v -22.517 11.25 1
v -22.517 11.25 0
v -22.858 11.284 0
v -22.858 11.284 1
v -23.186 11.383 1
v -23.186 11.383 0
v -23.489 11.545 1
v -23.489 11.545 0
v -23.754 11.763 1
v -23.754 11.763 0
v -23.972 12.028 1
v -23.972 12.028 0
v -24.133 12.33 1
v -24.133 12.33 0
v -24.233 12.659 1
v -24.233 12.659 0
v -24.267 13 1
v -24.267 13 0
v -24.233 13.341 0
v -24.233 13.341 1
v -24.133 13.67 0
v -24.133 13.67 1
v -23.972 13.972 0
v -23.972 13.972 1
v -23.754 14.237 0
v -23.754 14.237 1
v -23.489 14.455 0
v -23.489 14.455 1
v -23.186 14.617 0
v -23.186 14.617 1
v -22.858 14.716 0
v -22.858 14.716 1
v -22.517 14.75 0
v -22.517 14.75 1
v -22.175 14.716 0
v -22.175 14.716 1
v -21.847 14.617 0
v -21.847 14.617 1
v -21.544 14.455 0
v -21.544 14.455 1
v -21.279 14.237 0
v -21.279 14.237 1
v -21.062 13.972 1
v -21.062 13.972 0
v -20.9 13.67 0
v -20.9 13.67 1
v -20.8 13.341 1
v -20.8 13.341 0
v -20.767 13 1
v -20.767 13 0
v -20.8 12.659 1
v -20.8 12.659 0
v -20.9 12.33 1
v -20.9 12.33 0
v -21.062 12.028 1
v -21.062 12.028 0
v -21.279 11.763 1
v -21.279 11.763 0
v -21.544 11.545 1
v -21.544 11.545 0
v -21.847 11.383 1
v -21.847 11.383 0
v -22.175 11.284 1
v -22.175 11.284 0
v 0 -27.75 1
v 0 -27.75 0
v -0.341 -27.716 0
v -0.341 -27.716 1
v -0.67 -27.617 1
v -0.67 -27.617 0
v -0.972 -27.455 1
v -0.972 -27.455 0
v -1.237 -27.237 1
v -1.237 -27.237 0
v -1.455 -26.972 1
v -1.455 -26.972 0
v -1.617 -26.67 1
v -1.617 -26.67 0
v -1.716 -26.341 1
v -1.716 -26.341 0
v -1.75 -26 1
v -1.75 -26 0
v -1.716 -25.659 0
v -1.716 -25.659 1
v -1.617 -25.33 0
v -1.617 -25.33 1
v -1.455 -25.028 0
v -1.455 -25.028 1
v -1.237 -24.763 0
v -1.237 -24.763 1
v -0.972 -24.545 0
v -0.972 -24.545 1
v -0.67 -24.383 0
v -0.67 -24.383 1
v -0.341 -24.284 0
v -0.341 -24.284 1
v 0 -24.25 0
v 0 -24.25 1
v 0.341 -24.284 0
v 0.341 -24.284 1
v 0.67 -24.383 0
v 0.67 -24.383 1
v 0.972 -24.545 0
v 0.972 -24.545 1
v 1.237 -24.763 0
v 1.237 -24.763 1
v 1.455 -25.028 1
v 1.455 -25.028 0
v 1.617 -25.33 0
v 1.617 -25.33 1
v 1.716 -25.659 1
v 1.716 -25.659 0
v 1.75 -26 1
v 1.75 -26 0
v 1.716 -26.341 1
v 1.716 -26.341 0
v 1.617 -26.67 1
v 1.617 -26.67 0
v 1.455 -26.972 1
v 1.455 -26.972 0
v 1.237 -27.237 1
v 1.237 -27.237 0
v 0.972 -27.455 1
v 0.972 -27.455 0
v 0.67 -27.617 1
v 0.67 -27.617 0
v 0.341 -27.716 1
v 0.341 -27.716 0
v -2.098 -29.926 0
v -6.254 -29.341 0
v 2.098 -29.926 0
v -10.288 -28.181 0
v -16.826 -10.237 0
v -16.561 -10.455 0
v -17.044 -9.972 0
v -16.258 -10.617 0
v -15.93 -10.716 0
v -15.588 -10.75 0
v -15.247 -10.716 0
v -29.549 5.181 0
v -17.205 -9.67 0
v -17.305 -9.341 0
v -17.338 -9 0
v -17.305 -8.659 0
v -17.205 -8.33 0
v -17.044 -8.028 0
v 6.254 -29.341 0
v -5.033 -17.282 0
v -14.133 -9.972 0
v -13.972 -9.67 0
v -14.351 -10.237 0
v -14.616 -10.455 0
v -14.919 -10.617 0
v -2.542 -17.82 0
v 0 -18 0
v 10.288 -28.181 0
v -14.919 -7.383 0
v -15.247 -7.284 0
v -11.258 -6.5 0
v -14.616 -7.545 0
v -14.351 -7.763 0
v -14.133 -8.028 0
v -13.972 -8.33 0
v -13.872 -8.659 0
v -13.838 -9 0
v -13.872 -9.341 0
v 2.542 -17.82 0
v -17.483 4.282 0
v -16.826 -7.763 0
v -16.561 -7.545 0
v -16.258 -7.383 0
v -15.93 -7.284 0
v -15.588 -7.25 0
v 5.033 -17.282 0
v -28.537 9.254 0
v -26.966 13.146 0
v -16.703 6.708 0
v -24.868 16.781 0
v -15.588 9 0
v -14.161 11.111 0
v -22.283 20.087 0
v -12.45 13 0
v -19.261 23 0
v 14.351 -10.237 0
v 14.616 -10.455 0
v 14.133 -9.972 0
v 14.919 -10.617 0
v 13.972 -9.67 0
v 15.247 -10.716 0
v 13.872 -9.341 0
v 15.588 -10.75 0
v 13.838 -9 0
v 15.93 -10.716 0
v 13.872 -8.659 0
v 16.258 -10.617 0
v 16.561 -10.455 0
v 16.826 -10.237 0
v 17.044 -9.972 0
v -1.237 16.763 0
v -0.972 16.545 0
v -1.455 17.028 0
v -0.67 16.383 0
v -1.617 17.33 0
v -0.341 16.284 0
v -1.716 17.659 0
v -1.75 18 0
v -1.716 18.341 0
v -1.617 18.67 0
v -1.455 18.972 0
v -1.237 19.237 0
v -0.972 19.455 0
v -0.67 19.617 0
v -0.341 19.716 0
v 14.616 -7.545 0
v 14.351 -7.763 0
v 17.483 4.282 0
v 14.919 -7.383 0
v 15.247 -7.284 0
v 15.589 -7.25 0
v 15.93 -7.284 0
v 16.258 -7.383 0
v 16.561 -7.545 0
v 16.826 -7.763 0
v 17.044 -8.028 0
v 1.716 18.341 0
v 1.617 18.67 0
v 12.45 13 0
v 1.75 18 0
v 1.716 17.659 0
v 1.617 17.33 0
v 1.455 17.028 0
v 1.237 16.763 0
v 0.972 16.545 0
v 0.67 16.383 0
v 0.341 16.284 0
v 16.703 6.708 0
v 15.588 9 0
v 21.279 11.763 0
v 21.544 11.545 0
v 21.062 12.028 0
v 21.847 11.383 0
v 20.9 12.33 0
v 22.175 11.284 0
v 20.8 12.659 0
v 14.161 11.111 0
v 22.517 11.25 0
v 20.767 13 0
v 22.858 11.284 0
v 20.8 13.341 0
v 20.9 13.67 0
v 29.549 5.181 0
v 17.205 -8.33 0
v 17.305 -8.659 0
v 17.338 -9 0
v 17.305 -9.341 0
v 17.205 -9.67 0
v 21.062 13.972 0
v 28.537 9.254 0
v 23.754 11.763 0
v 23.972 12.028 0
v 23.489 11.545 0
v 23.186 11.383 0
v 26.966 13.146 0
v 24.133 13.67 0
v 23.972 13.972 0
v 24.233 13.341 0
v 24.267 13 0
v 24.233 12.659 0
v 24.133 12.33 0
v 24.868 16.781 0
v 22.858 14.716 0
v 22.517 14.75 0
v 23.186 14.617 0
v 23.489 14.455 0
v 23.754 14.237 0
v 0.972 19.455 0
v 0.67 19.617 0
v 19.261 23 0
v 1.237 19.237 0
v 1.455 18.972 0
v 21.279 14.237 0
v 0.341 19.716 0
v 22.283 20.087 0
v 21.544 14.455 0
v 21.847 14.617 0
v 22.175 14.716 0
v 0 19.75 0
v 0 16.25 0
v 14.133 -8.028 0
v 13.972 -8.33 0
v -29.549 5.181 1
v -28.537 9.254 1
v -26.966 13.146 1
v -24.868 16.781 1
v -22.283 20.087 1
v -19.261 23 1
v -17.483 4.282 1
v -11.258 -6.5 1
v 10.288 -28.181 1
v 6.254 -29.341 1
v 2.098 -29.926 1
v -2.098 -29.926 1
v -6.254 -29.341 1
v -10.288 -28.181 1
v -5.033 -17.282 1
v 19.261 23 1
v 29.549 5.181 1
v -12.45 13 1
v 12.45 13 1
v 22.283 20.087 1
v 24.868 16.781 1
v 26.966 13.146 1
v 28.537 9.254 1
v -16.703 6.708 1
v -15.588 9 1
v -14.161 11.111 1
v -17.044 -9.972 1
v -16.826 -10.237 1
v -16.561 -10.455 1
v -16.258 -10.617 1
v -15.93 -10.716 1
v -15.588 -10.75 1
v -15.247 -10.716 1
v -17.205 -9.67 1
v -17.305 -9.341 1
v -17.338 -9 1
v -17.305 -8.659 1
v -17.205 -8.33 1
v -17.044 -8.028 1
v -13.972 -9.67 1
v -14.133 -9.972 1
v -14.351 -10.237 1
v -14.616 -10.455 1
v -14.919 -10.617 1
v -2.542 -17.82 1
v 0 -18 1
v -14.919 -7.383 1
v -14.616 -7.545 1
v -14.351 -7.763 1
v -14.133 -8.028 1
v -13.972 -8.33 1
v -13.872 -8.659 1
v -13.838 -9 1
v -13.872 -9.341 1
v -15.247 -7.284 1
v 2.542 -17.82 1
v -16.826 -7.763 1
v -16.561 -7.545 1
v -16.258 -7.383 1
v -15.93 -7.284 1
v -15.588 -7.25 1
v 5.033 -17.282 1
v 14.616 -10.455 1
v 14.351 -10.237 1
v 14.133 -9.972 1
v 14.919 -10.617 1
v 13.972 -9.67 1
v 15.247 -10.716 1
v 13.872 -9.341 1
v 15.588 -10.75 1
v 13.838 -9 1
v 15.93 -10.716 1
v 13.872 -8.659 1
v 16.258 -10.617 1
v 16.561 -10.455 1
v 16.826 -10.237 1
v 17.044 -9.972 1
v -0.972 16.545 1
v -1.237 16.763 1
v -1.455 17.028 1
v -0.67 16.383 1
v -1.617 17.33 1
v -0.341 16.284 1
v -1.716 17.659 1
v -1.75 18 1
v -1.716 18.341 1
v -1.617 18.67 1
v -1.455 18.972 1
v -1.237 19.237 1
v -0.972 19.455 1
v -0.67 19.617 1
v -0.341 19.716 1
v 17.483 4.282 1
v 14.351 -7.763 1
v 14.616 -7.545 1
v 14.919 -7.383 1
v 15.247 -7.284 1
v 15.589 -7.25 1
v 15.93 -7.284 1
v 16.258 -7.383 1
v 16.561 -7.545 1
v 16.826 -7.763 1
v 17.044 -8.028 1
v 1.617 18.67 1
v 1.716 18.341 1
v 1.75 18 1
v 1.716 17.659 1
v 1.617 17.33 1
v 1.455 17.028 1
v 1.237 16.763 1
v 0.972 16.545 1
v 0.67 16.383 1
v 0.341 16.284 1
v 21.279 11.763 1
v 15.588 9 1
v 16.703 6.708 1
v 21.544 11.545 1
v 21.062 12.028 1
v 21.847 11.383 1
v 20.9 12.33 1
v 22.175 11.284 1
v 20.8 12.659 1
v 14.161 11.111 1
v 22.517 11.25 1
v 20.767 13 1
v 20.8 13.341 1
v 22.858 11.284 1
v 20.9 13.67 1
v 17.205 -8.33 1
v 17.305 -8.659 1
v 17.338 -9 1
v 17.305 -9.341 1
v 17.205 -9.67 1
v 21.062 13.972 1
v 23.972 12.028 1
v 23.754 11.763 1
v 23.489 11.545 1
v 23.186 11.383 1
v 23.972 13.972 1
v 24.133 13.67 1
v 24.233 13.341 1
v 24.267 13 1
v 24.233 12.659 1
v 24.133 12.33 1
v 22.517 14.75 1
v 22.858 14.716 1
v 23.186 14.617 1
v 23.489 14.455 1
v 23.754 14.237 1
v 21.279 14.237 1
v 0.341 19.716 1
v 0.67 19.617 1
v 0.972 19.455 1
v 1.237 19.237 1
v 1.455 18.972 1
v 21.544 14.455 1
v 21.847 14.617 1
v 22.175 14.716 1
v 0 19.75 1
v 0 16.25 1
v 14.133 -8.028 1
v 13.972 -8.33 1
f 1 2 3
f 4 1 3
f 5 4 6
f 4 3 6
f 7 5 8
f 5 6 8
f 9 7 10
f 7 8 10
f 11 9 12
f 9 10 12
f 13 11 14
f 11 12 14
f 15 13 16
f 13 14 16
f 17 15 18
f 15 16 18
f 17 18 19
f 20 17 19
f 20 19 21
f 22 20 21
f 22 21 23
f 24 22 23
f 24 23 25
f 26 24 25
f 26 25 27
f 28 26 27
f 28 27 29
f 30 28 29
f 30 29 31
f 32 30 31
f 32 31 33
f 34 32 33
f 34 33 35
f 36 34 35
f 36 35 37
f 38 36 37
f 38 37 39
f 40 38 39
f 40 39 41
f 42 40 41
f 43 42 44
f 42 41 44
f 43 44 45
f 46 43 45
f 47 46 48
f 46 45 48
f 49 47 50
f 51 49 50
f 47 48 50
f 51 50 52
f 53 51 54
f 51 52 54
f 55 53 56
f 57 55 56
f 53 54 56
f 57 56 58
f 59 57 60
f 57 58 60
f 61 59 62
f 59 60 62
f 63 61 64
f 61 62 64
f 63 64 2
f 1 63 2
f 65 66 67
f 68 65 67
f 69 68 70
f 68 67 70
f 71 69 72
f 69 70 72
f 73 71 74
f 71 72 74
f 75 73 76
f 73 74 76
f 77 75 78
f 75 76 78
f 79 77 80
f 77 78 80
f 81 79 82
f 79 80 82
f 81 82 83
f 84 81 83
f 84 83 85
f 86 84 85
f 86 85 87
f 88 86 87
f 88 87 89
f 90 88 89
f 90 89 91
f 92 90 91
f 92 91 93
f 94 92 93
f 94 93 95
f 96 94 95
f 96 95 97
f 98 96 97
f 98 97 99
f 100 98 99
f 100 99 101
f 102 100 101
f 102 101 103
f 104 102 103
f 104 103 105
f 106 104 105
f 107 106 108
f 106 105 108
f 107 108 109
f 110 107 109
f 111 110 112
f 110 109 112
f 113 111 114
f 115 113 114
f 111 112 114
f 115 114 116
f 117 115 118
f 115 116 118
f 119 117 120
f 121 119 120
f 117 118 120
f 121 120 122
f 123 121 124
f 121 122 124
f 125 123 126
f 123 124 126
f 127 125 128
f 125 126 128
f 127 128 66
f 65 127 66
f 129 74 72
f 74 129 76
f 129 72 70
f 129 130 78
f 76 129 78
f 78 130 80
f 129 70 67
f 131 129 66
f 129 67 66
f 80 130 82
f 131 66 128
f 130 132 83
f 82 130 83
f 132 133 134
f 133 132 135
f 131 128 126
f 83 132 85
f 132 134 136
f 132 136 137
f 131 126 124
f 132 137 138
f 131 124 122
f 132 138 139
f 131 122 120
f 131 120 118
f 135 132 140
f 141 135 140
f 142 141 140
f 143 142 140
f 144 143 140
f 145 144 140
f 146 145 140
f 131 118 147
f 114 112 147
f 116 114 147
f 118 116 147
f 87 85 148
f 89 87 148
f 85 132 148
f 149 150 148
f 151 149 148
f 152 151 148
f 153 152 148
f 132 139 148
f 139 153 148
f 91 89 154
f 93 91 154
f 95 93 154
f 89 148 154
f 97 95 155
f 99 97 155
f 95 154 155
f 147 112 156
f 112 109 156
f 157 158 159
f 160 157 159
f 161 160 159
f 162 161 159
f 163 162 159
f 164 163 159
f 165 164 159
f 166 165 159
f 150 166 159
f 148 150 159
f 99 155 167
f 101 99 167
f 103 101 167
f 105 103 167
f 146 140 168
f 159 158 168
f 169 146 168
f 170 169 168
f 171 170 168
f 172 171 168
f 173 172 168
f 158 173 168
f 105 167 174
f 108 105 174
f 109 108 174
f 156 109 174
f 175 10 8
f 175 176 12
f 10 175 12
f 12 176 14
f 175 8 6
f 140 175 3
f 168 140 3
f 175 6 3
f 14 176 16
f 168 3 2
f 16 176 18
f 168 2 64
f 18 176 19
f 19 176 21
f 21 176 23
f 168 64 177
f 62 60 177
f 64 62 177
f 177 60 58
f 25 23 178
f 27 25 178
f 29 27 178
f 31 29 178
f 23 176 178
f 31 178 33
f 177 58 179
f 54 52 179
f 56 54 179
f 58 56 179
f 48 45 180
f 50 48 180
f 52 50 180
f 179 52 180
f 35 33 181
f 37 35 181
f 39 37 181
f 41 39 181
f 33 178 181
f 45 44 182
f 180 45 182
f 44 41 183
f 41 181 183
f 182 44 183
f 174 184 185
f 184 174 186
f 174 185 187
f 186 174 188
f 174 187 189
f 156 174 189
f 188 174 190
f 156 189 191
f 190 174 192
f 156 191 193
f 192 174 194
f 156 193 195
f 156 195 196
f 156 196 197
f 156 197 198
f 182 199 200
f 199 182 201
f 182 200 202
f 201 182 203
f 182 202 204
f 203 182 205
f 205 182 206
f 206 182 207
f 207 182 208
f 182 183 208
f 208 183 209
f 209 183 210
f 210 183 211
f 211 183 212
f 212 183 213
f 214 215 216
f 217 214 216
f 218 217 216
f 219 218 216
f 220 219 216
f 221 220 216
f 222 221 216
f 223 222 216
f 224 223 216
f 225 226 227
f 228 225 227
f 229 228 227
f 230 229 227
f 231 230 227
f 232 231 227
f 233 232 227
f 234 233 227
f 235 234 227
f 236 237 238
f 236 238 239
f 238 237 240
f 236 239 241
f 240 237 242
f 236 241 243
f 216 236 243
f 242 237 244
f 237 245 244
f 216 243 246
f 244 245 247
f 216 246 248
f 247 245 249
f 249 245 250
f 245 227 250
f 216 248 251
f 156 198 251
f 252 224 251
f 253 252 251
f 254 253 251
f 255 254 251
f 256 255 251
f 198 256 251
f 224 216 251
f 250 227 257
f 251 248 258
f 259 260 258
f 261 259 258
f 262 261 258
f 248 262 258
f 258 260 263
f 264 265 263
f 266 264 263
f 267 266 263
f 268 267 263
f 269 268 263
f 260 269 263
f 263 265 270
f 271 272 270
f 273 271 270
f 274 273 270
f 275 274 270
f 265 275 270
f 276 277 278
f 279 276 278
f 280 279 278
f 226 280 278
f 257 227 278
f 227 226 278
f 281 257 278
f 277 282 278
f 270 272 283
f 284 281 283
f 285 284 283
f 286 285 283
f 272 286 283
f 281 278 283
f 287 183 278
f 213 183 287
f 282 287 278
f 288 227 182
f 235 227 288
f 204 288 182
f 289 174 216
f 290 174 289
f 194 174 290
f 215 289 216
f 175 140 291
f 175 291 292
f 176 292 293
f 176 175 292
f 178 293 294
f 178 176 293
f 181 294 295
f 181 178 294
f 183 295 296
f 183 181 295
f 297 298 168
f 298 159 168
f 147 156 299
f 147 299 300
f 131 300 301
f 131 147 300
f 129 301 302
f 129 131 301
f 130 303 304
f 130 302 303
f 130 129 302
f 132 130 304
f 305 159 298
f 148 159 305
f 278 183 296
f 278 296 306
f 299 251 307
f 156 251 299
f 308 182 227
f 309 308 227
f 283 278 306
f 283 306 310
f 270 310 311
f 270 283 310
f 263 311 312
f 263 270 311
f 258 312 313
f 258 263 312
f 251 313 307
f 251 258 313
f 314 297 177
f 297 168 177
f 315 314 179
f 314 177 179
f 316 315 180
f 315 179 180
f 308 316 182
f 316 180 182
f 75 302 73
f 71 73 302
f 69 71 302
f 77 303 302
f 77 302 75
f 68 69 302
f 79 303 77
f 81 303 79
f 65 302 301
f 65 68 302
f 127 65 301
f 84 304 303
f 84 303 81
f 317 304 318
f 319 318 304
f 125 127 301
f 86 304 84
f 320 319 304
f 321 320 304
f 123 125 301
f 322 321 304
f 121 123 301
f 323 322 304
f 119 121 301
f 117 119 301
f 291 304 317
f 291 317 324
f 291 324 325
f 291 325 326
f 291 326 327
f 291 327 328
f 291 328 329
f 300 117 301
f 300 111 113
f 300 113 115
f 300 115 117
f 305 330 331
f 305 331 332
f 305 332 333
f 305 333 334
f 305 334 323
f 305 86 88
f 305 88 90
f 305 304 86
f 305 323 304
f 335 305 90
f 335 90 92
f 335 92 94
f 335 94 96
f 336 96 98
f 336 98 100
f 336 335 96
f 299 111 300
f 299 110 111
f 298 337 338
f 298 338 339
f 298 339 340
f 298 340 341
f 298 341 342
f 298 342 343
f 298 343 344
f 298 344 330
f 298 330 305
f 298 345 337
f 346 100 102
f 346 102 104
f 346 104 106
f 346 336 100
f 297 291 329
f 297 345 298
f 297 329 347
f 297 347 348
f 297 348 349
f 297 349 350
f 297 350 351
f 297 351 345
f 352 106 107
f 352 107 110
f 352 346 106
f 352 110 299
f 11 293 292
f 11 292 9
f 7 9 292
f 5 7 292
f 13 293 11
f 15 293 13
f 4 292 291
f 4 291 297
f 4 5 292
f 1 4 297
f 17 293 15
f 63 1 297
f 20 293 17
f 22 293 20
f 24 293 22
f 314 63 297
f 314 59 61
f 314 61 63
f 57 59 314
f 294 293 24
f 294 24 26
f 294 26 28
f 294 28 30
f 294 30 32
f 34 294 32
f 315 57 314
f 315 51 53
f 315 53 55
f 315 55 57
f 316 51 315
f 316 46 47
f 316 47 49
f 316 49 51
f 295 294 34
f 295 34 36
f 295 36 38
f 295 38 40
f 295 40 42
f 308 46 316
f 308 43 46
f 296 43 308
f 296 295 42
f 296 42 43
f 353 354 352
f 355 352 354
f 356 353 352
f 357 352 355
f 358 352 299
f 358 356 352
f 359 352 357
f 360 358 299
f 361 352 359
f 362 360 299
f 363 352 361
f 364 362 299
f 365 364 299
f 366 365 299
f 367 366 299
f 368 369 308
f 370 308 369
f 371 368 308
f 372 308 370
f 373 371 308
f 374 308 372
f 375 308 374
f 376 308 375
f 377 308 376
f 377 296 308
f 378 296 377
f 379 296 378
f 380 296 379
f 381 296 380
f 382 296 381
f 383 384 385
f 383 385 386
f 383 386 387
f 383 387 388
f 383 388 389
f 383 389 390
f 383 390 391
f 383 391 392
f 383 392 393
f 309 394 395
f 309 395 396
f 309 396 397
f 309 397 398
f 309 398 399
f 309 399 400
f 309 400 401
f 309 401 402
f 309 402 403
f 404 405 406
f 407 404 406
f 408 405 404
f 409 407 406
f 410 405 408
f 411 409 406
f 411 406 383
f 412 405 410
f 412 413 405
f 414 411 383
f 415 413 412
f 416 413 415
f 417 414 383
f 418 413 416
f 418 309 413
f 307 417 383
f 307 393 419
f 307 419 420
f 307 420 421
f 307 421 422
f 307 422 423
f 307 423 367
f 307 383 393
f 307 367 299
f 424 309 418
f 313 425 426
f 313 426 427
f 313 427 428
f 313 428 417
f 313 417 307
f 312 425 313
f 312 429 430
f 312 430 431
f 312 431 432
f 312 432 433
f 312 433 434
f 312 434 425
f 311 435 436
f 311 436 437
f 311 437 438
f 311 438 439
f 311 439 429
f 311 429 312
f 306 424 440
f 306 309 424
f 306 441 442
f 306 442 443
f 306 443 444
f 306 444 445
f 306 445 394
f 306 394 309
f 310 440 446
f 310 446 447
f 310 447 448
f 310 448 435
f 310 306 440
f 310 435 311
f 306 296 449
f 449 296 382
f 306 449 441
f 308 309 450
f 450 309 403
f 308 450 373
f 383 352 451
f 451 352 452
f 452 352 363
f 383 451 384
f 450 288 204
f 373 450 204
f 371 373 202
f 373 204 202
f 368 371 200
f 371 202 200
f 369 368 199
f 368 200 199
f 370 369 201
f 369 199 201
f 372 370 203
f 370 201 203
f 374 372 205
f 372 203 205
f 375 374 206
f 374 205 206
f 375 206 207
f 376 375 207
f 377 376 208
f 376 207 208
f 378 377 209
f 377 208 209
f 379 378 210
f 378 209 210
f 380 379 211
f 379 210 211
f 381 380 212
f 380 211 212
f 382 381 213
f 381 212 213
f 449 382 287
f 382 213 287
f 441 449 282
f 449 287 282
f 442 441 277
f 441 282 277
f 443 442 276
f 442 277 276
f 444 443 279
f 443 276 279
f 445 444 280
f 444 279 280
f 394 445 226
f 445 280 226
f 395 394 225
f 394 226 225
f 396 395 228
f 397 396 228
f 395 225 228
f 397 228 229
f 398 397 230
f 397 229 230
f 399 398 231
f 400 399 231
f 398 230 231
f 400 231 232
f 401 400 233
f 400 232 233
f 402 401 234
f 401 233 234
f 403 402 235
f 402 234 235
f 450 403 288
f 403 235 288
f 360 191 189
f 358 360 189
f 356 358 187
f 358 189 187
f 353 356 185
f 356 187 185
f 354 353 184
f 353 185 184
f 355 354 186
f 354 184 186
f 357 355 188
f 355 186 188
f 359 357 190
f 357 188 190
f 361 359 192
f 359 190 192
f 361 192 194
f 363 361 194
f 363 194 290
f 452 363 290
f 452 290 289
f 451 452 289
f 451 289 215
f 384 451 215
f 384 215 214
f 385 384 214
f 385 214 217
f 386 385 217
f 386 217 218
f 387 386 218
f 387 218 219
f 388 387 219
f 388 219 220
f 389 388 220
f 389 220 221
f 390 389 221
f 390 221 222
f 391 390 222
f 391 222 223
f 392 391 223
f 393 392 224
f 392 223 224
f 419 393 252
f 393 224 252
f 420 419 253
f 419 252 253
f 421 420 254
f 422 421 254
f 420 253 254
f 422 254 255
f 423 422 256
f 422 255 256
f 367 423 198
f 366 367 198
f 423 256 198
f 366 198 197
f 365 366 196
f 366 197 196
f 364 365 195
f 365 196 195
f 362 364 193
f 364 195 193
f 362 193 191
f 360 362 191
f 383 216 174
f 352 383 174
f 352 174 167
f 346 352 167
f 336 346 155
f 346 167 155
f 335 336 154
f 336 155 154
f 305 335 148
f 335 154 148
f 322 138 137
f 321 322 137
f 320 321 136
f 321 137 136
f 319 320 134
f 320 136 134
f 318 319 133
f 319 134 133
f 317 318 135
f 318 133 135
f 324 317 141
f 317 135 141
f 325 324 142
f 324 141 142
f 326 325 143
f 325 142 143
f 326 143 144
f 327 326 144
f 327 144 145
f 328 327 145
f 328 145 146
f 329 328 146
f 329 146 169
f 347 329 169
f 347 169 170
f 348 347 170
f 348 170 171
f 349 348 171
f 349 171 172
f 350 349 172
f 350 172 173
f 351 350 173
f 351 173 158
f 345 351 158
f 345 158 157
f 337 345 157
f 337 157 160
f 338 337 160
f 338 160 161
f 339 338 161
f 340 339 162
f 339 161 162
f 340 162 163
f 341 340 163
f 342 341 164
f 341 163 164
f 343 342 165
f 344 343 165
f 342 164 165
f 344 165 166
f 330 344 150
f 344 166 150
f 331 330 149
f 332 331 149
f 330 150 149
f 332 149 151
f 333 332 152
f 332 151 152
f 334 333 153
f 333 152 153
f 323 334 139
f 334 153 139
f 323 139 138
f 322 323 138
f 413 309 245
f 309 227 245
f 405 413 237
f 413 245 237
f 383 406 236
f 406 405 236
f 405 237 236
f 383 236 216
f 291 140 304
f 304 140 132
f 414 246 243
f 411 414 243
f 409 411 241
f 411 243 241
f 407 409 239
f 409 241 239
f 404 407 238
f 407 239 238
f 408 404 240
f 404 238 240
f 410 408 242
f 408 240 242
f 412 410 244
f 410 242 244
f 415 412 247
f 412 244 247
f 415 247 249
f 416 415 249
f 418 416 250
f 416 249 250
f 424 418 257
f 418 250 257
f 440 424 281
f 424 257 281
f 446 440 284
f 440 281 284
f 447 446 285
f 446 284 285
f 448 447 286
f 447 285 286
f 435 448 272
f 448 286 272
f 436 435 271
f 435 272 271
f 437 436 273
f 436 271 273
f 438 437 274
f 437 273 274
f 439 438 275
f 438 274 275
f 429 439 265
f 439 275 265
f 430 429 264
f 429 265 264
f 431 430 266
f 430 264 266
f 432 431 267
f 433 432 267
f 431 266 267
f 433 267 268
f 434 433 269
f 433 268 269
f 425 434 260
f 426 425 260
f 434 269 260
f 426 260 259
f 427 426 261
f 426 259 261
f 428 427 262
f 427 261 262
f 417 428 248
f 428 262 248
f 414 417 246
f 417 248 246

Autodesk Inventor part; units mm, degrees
ref_plane "YZ Plane" through (0, 0, 0) normal (1, 0, 0) x (0, 1, 0)
ref_plane "XZ Plane" through (0, 0, 0) normal (0, 1, 0) x (-1, 0, 0)
ref_plane "XY Plane" through (0, 0, 0) normal (0, 0, 1) x (1, 0, 0)
sketch "スケッチ1" plane through (0, 0, 0) normal (0, 0, 1) x (1, 0, 0)
  arc A0 (29.5493, 5.1808) -> (19.2614, 23) centre (0, 0) ccw
  arc A1 (-19.2614, 23) -> (-29.5493, 5.1808) centre (0, 0) ccw
  arc A2 (-10.2879, -28.1808) -> (10.2879, -28.1808) centre (0, 0) ccw
  line L0 (29.5493, 5.1808) -> (10.2879, -28.1808)
  line L1 (0, 23) -> (19.2614, 23)
  line L2 (19.9186, -11.5) -> (29.5493, 5.1808)
  line L3 (-19.9186, -11.5) -> (-29.5493, 5.1808)
  line L4 (19.2614, 23) -> (-19.2614, 23)
  line L5 (-29.5493, 5.1808) -> (-10.2879, -28.1808)
  arc A3 (17.4833, 4.2819) -> (12.4499, 13) centre (0, 0) ccw
  arc A4 (-12.4499, 13) -> (-17.4833, 4.2819) centre (0, 0) ccw
  arc A5 (-5.0334, -17.2819) -> (5.0334, -17.2819) centre (0, 0) ccw
  line L6 (0, 13) -> (12.4499, 13)
  line L7 (17.4833, 4.2819) -> (5.0334, -17.2819)
  line L8 (-11.2583, -6.5) -> (-17.4833, 4.2819)
  line L9 (0, 13) -> (-12.4499, 13)
  line L10 (-17.4833, 4.2819) -> (-5.0334, -17.2819)
  point P0 (11.2583, -6.5)
  dimension "d10" = 360
  dimension "d6" = 23
extrude "押し出し1" add sketch "スケッチ1" along normal blind 1
sketch "スケッチ2" plane through (0, 0, 1) normal (0, 0, 1) x (1, 0, 0)
  point P0 (0, 0)
  point P1 (0, 18)
  point P2 (0, 0)
  point P3 (-15.5885, -9)
  point P4 (0, 0)
  point P5 (15.5885, -9)
  point P6 (0, -26)
  point P7 (22.5167, 13)
  point P8 (-22.5167, 13)
  dimension "d15" = 18
  dimension "d18" = 360
  dimension "d20" = 26
  dimension "d23" = 360
hole "穴1" at (0, 18, 1) at (-15.5885, -9, 1) at (15.5885, -9, 1) at (0, -26, 1) at (22.5167, 13, 1) at (-22.5167, 13, 1) direction (0, 0, -1) diameter 3.5 end through all
properties part number "スプリングフランジ"
